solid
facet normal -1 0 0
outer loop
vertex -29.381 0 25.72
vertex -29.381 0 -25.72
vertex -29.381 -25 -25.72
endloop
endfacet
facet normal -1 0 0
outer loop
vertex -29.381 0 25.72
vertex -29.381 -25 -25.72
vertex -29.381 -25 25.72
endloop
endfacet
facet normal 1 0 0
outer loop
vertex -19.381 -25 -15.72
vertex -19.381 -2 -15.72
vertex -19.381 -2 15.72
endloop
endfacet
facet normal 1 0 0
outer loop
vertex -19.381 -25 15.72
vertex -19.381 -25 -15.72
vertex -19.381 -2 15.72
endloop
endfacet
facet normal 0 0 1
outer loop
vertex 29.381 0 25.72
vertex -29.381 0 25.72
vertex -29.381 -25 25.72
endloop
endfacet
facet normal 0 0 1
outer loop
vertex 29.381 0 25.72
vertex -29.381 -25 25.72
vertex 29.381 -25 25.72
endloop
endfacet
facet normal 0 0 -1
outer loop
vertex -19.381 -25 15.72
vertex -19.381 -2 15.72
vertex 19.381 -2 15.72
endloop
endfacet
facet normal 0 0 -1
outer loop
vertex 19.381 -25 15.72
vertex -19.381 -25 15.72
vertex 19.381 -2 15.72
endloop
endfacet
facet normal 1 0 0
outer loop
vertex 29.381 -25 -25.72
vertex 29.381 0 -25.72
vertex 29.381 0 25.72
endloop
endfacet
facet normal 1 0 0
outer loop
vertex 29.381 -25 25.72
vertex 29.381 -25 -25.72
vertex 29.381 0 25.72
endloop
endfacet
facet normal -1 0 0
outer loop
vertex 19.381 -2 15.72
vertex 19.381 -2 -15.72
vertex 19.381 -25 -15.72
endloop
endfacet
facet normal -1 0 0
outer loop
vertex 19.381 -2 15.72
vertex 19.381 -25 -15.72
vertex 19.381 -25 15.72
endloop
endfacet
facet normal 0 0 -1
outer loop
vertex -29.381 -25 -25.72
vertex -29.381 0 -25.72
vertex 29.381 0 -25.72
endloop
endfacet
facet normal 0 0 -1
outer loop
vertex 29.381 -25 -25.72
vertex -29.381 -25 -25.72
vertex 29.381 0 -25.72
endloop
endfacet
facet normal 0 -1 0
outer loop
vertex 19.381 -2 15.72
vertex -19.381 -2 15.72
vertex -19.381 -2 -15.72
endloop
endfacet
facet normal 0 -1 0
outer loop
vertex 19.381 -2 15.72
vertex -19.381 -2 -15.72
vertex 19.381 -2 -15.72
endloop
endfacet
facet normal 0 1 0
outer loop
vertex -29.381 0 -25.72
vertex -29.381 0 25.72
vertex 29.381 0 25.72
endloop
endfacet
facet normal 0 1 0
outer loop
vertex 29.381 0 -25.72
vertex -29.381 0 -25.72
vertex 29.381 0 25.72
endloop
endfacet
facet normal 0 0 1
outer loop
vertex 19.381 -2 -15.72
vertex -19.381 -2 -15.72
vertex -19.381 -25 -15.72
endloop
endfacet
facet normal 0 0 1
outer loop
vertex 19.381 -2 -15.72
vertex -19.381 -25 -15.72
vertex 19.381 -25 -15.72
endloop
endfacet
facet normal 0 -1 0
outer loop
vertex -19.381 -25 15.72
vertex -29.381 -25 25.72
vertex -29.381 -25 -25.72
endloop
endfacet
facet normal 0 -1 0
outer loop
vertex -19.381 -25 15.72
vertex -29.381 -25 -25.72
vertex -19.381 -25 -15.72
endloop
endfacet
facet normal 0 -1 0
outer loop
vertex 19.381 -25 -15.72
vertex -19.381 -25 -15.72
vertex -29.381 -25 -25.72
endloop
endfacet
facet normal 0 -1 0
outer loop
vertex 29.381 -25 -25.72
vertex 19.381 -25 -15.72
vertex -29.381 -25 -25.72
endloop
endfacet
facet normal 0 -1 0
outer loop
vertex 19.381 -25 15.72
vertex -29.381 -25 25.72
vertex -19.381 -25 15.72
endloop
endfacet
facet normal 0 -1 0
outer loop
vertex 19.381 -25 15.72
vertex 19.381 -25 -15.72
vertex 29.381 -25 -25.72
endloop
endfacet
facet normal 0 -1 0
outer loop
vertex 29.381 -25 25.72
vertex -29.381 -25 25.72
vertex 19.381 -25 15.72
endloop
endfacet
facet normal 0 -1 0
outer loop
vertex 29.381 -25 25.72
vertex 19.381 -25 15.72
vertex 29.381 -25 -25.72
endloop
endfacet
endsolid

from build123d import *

# Parameters (mm, degrees)
F1_W     = 58.76257
F1_H     = 51.44095
F1_W_2   = 38.76257
F1_H_2   = 31.44095
F2_DEPTH = 25
F0_W     = 58.76257
F0_H     = 51.44095
F0_W_2   = 38.76257
F0_H_2   = 31.44095
F3_DEPTH = 2


with BuildPart() as f2:
    # F1 (on face) → F2 (new body)
    with BuildSketch(Plane.XZ):
        Rectangle(F1_W, F1_H)
        Rectangle(F1_W_2, F1_H_2, mode=Mode.SUBTRACT)
    extrude(amount=F2_DEPTH)

    # F0 (on Front) + F1 (on face) → F3 (join)
    with BuildSketch(Plane.XZ):
        Rectangle(F0_W, F0_H)
        Rectangle(F0_W_2, F0_H_2, mode=Mode.SUBTRACT)
    with BuildSketch(Plane.XZ):
        Rectangle(F1_W_2, F1_H_2)
    extrude(amount=F3_DEPTH)


solid = f2.part
